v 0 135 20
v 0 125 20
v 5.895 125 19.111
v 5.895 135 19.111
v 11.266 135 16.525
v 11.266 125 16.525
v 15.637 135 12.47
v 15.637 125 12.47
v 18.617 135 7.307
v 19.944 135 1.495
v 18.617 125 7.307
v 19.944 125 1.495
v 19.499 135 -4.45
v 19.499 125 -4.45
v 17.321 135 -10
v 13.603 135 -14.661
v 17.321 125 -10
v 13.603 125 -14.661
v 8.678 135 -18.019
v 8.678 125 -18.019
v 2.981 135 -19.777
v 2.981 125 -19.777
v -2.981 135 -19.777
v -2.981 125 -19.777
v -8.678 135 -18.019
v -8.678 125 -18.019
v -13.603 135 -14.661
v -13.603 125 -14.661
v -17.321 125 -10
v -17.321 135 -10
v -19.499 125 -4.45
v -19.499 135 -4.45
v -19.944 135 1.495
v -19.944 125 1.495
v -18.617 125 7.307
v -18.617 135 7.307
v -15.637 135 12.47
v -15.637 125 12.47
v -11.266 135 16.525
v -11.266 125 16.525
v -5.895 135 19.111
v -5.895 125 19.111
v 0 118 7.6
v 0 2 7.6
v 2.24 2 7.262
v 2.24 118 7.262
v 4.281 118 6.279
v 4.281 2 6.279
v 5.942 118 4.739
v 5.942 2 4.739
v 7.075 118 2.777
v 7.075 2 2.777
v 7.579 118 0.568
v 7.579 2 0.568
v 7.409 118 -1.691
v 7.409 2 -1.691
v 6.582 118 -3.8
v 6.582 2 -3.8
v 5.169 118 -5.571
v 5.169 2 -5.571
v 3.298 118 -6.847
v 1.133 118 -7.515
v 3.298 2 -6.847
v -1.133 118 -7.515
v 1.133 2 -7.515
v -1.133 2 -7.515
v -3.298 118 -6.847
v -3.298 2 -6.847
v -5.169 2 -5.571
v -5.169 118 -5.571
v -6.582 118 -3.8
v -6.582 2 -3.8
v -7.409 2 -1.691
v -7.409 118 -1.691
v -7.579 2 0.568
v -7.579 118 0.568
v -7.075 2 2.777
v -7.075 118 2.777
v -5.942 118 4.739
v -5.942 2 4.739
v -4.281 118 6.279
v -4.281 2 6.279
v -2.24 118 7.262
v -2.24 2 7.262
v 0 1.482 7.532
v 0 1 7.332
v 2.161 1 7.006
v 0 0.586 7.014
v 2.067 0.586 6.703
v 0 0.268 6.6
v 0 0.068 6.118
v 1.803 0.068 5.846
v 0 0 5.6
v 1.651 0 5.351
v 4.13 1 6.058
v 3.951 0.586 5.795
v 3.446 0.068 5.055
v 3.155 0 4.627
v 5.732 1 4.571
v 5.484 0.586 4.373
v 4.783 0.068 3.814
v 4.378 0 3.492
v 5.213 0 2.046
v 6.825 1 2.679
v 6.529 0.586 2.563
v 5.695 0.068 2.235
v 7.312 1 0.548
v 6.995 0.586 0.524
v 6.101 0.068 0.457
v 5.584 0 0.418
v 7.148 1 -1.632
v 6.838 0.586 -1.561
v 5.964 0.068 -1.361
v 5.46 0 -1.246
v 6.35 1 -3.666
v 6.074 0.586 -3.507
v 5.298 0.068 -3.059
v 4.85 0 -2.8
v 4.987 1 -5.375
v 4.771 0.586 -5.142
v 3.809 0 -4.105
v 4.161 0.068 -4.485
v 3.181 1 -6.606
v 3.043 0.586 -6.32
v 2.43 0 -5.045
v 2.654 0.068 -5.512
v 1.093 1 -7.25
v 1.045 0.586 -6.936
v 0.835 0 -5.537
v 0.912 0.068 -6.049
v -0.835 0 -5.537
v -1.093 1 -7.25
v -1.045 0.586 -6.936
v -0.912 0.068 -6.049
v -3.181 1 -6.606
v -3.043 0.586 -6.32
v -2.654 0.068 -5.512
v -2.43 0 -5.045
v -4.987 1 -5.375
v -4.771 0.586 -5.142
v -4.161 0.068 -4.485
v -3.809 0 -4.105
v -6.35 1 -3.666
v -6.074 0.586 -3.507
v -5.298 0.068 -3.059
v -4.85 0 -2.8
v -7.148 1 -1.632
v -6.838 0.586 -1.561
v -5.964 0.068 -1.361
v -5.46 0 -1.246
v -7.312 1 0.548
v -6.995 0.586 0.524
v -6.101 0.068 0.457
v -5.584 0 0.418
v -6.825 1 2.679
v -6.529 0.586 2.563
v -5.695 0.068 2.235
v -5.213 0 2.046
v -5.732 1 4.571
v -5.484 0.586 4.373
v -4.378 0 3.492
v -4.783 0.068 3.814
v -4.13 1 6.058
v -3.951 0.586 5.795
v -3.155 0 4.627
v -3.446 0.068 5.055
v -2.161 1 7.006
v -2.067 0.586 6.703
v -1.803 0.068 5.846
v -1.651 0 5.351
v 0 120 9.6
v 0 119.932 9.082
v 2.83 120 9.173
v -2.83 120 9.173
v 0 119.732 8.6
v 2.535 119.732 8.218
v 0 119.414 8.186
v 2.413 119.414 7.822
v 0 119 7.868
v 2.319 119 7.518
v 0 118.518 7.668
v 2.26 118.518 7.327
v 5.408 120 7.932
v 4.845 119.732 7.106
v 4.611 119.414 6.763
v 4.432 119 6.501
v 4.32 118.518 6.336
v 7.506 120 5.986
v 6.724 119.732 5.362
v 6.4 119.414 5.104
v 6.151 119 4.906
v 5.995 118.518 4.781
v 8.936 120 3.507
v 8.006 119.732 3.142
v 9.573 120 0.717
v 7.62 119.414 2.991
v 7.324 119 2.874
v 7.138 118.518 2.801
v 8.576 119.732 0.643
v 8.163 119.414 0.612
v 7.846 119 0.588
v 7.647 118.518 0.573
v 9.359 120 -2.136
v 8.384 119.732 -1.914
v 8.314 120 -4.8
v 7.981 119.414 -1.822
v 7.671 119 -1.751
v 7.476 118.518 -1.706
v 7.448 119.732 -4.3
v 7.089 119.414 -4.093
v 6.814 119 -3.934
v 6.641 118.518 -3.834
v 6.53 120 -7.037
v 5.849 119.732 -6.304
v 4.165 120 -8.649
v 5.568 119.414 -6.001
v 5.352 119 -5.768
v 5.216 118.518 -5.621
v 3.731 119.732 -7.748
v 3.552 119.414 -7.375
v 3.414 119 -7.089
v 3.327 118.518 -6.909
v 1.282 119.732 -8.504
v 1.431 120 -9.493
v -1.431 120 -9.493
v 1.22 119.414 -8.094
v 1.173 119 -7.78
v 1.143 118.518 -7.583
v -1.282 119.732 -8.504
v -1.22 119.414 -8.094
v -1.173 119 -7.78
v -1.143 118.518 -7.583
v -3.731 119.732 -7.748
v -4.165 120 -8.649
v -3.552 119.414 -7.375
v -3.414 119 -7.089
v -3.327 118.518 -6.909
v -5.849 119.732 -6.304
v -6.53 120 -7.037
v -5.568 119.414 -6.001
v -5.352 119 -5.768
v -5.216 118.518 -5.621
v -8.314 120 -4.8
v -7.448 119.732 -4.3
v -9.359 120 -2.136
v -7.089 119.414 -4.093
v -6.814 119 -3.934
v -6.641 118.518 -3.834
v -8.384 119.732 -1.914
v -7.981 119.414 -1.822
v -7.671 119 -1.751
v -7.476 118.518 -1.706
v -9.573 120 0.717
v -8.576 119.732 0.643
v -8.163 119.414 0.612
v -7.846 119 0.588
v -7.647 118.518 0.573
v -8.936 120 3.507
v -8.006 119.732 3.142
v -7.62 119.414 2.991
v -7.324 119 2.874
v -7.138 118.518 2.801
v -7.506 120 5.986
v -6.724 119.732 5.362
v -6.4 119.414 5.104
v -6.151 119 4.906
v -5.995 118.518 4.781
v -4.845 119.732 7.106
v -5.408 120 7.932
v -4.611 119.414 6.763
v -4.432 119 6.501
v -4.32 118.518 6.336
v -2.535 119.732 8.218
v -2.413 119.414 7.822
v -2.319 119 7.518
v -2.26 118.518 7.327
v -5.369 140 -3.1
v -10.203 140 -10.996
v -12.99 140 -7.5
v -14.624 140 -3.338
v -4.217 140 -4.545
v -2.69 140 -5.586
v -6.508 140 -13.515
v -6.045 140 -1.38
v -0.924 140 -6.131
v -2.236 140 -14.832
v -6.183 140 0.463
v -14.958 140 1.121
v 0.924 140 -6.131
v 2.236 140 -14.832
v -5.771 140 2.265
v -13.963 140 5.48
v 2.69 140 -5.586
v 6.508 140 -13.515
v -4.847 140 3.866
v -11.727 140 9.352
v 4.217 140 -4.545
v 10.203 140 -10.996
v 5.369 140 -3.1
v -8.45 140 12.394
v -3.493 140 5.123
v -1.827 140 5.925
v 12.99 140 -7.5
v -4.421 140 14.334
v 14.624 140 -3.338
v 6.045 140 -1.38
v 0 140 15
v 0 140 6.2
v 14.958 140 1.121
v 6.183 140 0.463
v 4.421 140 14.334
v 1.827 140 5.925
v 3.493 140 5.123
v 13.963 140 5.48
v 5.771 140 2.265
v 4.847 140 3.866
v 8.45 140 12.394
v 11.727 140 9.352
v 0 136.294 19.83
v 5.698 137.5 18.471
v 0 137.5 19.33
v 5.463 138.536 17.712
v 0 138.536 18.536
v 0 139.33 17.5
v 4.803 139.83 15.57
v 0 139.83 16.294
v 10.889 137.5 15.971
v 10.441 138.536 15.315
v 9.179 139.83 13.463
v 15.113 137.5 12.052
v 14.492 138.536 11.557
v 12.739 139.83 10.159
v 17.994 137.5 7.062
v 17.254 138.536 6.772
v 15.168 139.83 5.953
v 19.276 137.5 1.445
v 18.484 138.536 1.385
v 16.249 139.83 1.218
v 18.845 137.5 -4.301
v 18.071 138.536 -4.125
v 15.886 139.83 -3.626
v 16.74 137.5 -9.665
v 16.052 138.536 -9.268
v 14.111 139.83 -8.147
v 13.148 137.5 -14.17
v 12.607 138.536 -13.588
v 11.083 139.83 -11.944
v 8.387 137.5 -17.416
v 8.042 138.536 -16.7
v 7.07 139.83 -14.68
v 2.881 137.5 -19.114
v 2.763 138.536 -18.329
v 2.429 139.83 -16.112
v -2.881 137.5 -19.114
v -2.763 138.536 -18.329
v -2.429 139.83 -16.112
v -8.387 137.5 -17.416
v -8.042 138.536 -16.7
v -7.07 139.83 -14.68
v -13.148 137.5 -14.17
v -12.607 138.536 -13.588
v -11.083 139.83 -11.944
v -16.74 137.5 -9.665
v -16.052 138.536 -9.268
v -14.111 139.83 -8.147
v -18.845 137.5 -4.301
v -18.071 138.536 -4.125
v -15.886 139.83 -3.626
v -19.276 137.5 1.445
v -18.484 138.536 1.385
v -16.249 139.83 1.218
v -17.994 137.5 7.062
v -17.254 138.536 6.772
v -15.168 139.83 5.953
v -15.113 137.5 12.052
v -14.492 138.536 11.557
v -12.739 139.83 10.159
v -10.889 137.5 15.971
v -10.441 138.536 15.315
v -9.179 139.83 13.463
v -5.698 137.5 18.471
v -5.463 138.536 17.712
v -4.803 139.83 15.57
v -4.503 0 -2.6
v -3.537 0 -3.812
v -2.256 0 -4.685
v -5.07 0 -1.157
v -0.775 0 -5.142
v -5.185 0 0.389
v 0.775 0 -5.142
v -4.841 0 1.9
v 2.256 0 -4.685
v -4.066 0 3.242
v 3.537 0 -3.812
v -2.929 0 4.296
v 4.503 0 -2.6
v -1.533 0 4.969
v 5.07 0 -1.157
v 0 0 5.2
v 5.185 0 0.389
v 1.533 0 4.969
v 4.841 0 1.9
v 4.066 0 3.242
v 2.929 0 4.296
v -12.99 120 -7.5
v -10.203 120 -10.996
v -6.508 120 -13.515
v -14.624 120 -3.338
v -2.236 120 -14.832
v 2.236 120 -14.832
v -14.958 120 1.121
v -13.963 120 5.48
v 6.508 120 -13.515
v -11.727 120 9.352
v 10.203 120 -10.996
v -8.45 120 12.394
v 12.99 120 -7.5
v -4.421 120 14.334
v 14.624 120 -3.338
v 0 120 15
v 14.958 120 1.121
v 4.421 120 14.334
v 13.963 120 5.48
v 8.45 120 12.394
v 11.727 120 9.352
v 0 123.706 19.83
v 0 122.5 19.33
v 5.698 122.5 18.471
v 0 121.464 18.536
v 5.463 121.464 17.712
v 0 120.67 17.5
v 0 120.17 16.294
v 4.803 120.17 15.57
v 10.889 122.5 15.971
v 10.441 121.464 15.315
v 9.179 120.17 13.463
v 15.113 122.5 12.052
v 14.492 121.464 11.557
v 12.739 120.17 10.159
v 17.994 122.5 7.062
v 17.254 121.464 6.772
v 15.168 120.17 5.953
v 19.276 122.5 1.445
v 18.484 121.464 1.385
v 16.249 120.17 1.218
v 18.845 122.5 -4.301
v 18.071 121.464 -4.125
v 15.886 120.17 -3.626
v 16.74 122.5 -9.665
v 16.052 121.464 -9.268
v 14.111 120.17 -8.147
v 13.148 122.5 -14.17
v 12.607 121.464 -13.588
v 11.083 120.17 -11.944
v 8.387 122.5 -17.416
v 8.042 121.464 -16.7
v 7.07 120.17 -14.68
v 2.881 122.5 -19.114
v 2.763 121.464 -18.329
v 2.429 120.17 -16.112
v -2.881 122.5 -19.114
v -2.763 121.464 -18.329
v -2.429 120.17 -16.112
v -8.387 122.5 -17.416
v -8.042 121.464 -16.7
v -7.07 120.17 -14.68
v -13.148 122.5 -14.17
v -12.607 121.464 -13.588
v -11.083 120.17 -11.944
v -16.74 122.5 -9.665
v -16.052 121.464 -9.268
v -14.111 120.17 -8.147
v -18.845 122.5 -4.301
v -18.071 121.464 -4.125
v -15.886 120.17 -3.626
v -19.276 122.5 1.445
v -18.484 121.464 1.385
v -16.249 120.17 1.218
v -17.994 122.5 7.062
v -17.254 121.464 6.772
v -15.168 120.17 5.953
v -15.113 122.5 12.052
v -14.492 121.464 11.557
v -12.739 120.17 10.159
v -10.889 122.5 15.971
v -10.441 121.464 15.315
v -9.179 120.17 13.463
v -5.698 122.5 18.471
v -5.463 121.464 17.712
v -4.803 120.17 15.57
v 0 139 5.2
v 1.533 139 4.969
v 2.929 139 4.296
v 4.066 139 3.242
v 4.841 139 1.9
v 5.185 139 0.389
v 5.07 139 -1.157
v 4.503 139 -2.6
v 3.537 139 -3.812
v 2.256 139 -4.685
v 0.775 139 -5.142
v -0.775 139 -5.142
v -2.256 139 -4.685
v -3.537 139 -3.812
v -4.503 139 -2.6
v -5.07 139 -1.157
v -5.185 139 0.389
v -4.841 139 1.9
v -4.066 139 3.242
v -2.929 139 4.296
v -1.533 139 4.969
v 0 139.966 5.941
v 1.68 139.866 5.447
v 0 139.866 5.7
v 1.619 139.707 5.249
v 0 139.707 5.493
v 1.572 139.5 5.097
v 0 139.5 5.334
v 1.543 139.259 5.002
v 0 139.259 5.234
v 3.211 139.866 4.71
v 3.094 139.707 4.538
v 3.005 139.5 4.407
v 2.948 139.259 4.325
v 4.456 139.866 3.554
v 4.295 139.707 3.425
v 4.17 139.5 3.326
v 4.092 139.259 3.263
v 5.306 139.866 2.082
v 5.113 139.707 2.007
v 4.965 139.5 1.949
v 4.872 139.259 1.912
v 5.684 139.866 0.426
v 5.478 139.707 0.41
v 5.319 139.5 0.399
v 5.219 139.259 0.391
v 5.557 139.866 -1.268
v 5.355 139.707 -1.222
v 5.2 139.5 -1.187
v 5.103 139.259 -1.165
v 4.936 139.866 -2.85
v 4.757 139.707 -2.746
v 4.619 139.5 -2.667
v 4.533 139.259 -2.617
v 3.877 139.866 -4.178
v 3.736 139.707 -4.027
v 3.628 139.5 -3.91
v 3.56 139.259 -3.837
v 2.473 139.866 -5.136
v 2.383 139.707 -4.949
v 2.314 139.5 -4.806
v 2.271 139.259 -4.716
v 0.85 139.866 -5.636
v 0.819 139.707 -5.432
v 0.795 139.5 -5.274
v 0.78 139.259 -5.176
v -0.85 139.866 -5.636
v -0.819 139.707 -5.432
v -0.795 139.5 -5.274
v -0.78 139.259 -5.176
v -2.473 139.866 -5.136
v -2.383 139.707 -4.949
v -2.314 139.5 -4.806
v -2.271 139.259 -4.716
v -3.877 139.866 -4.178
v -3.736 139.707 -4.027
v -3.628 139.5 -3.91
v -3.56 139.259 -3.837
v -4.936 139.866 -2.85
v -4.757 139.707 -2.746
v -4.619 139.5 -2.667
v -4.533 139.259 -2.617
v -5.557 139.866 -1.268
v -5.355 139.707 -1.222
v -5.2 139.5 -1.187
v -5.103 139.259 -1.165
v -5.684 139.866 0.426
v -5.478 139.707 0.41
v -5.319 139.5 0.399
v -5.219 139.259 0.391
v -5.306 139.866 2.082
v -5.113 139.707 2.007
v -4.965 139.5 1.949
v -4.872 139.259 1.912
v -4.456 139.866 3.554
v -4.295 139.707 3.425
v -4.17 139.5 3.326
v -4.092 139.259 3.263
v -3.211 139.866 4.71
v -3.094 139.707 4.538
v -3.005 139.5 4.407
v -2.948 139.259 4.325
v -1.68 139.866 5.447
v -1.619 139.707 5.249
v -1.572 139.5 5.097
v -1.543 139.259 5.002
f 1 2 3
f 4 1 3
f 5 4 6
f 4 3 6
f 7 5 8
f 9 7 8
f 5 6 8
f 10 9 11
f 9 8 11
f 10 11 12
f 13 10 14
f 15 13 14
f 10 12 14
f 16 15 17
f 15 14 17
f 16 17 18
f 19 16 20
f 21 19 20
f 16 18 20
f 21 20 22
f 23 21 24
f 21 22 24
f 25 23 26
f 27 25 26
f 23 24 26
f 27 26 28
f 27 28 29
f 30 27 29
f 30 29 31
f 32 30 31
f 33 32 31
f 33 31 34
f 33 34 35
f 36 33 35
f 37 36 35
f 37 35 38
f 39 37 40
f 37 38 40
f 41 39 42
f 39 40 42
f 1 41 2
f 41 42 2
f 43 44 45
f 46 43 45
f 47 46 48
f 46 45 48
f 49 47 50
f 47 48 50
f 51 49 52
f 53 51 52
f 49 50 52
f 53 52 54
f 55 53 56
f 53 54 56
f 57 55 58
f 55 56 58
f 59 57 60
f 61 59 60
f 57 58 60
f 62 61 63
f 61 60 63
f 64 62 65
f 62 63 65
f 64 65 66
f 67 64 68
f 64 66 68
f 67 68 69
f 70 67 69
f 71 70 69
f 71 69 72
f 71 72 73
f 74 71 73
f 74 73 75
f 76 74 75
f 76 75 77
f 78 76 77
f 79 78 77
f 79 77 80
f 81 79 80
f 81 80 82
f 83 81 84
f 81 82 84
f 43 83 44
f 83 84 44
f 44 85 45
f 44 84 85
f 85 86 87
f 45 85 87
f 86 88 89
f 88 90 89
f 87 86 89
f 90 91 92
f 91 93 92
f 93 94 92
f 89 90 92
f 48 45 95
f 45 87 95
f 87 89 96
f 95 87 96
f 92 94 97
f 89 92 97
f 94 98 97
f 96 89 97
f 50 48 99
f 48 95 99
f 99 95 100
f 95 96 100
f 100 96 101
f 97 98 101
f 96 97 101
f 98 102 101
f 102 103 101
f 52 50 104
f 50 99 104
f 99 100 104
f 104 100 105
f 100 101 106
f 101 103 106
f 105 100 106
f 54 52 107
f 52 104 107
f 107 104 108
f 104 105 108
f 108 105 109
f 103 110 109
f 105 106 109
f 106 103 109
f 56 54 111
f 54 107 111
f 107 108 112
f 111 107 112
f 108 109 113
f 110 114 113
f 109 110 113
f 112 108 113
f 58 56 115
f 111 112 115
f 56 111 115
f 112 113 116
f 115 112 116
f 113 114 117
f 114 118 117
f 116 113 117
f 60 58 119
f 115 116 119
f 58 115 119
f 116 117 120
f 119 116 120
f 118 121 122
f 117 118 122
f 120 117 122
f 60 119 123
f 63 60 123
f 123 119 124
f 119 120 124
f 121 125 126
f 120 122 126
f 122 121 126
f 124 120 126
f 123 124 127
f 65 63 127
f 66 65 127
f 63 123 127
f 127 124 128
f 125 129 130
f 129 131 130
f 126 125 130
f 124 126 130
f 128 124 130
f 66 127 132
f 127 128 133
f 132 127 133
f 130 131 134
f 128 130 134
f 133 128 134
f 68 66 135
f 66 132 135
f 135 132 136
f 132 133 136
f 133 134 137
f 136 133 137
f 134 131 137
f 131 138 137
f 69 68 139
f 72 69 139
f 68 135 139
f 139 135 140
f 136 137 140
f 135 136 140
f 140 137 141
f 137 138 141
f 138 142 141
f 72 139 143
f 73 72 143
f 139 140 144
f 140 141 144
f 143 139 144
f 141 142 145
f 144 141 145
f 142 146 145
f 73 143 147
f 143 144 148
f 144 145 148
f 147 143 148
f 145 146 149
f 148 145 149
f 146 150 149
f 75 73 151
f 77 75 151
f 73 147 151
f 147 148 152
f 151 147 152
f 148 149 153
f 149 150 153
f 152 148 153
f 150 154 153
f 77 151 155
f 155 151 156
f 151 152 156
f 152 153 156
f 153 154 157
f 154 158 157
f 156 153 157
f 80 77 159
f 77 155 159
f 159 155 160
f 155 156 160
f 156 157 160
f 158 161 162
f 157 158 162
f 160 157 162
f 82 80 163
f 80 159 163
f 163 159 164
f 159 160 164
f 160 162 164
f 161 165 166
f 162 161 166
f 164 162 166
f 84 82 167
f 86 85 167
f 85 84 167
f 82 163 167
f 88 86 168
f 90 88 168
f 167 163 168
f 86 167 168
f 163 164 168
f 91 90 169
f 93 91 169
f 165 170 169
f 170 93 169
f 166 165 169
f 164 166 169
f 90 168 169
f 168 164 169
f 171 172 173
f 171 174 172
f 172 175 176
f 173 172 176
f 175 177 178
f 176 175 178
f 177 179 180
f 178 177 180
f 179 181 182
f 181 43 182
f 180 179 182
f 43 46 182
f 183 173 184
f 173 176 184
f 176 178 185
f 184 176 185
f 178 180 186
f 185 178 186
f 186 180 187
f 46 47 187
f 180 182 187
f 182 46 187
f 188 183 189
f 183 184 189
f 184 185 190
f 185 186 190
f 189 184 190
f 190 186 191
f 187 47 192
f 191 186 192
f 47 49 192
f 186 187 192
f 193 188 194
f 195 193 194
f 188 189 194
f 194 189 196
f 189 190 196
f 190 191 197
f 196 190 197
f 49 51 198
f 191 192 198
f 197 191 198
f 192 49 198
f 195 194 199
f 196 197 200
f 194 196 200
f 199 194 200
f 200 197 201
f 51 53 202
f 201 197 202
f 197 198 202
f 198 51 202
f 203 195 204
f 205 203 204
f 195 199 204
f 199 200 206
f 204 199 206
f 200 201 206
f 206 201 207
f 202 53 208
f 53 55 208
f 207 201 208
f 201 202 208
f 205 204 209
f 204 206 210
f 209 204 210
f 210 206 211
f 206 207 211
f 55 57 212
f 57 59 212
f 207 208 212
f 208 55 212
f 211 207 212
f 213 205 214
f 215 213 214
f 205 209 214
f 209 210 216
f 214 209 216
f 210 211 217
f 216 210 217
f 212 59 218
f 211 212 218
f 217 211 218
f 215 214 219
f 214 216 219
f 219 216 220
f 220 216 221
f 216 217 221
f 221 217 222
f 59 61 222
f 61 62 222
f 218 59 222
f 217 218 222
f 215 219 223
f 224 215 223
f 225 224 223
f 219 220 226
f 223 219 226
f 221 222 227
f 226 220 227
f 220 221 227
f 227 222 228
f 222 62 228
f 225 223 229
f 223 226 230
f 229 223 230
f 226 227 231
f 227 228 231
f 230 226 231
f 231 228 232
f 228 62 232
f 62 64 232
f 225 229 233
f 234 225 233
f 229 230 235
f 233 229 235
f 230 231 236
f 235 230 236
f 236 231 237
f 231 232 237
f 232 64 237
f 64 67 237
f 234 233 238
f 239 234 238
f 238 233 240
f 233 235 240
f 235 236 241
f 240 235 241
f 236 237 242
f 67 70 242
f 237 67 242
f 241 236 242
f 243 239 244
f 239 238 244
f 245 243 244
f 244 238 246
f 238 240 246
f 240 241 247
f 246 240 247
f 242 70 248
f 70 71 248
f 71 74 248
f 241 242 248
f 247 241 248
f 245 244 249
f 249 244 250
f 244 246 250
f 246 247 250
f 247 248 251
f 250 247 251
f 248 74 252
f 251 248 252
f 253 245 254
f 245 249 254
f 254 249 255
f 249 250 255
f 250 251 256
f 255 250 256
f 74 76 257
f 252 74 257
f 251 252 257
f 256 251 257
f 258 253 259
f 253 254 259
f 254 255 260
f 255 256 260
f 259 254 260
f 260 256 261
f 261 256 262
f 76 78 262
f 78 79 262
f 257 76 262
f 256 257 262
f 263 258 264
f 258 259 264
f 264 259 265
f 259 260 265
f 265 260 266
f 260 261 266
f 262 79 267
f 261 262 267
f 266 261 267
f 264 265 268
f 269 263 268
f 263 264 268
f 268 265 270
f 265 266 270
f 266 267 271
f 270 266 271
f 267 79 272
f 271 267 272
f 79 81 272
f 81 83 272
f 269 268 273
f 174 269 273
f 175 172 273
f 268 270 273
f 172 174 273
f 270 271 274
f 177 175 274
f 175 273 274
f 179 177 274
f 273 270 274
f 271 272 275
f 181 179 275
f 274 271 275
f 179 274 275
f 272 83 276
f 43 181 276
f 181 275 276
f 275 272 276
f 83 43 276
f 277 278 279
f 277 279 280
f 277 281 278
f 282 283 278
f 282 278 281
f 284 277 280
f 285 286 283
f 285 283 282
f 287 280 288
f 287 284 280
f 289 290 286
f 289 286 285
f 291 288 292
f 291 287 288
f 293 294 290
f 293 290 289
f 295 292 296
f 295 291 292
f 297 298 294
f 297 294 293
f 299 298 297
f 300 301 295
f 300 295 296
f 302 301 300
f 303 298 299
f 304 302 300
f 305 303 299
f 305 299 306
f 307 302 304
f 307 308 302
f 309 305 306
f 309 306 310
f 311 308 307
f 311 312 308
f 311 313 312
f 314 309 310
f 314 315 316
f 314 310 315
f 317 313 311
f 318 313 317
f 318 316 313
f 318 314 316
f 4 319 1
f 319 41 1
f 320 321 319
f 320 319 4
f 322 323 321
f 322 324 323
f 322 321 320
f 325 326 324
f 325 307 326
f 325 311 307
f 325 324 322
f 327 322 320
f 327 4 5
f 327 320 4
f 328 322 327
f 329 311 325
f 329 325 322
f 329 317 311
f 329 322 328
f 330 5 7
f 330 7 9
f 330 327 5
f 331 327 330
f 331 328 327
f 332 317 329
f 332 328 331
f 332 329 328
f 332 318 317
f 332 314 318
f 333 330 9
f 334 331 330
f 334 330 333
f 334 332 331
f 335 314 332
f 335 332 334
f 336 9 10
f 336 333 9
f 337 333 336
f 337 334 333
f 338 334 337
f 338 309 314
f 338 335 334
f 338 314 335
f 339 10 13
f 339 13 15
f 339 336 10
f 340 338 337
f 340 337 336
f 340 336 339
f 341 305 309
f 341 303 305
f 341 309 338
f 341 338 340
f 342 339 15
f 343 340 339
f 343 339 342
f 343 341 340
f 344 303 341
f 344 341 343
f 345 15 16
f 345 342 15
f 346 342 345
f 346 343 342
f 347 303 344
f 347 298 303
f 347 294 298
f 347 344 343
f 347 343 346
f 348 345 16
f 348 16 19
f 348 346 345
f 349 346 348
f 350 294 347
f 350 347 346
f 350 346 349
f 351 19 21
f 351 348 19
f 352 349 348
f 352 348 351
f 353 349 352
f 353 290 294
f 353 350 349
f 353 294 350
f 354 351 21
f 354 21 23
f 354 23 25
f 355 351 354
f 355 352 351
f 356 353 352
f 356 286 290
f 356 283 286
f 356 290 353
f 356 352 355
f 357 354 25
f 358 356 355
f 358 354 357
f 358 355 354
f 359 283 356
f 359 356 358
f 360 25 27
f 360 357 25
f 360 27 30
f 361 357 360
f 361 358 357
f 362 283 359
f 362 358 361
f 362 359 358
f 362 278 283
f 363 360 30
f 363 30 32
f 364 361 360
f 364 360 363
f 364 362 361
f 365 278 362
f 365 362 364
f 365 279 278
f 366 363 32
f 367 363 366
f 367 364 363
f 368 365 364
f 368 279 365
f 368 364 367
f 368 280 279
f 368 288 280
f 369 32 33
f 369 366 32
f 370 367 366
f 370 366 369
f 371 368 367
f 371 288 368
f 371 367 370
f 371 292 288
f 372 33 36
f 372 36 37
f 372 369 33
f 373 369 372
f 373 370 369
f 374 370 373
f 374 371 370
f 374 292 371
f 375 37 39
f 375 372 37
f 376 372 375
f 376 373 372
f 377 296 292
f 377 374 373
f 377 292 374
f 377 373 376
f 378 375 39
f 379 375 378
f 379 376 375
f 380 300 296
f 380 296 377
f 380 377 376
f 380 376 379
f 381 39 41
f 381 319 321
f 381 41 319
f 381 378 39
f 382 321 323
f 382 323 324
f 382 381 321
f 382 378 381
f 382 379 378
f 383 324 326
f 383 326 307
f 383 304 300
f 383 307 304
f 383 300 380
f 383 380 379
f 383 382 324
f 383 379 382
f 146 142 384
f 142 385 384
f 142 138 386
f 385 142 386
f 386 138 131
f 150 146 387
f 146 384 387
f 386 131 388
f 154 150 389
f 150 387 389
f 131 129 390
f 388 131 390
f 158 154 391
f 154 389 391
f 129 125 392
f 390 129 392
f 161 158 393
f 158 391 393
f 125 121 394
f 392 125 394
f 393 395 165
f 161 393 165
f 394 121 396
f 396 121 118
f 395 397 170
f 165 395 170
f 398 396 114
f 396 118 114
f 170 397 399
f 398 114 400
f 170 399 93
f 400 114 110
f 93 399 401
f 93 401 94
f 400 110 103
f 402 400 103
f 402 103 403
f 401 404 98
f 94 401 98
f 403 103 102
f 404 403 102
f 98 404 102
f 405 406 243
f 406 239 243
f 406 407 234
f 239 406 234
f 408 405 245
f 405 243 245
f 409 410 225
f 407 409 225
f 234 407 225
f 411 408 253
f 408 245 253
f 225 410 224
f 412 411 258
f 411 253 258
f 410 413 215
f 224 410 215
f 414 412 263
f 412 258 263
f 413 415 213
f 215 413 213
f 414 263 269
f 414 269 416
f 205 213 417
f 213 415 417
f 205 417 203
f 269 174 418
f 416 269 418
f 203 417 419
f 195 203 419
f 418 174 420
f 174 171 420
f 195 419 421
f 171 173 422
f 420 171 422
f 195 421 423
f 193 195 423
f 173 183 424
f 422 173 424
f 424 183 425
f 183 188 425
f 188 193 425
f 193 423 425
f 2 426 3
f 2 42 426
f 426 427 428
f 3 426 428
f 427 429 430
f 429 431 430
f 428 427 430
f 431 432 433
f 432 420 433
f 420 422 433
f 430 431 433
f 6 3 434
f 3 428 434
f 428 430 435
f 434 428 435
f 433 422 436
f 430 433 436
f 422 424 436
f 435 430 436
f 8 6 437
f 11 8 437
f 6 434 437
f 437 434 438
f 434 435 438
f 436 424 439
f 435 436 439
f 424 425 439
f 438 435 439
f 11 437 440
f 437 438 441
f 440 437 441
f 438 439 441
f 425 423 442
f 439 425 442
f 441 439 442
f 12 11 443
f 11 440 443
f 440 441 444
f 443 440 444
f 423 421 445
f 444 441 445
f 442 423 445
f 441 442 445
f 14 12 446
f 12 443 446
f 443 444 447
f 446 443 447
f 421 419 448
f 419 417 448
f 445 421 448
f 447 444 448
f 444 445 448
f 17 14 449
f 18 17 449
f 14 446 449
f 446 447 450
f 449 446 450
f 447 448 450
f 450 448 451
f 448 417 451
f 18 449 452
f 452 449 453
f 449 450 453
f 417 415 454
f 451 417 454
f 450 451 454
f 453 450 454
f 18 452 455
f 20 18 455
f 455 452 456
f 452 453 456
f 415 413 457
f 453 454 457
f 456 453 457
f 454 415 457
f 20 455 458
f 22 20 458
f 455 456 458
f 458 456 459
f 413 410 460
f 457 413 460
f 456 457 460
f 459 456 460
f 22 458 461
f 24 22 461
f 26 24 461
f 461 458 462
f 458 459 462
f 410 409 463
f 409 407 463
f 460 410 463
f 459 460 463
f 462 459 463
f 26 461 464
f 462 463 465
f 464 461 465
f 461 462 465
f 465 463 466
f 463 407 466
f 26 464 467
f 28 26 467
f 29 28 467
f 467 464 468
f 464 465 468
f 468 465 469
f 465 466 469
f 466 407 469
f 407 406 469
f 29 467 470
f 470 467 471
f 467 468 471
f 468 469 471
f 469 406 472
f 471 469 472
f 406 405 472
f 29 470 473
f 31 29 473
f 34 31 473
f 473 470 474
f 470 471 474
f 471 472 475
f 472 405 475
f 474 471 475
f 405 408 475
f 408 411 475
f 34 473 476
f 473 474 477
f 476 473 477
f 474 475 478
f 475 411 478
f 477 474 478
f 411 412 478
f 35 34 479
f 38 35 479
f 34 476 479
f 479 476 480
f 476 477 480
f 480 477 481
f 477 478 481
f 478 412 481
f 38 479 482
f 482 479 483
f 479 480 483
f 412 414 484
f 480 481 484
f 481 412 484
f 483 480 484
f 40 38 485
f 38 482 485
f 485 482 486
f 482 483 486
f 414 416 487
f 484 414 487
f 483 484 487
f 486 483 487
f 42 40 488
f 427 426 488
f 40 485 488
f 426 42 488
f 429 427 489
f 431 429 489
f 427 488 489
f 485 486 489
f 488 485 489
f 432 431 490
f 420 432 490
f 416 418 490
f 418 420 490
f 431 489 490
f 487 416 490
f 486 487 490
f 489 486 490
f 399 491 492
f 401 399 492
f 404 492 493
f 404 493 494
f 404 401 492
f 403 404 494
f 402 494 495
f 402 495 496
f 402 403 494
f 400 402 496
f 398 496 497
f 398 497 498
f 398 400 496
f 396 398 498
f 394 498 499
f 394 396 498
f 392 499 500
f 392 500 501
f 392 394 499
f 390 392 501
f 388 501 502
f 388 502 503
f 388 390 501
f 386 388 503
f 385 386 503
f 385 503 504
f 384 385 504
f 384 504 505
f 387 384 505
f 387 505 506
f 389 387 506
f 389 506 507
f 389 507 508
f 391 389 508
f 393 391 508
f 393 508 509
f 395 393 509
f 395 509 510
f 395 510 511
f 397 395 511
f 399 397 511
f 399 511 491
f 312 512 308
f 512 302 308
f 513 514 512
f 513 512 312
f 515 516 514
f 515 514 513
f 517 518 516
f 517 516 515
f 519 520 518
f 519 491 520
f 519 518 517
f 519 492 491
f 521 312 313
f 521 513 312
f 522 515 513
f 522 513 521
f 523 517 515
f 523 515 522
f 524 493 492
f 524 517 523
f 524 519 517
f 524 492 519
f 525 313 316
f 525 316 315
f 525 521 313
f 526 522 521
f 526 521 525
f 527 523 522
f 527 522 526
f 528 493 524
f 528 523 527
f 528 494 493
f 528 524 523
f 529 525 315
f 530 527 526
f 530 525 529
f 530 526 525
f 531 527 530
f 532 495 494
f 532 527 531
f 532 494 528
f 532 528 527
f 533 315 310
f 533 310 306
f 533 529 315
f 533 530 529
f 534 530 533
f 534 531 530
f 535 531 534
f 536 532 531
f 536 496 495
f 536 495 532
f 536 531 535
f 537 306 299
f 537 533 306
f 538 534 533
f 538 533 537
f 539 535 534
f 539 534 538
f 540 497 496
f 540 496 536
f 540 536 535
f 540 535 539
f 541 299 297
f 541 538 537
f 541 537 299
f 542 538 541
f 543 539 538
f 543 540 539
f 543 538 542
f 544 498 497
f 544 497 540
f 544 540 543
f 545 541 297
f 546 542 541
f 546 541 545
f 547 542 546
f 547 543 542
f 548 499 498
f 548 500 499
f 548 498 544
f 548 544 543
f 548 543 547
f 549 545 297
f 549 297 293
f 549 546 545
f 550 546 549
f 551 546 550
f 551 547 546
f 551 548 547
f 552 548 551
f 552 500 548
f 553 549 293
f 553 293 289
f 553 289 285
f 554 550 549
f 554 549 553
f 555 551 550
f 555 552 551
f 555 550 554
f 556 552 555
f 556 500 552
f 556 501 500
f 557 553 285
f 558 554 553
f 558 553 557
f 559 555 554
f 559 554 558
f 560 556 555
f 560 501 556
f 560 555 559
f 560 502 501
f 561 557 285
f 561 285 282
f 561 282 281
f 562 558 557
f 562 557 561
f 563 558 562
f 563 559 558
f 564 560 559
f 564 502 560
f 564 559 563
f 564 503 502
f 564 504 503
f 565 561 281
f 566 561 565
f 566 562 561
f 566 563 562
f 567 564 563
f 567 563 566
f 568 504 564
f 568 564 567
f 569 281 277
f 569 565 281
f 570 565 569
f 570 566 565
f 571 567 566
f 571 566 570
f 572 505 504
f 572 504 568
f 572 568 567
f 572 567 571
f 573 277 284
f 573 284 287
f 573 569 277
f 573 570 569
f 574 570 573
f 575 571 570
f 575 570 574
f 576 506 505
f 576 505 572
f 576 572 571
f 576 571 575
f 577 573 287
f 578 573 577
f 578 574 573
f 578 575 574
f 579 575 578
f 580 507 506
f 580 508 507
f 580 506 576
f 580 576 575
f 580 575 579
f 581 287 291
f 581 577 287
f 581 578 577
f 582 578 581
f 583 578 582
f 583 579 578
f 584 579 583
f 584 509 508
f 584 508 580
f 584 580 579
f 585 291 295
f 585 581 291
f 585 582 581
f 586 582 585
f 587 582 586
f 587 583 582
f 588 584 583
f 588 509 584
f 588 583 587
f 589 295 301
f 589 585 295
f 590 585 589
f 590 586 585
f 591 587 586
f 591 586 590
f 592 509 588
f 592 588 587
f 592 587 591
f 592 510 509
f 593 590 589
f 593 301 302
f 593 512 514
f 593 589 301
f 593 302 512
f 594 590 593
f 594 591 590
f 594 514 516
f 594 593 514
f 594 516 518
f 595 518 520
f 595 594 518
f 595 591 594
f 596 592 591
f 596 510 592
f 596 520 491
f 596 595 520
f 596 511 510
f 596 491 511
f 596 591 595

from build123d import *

# Parameters (mm, degrees)
SKETCH_1_R          = 7.6
SKETCH_1_R_2        = 5.2
EXTRUDE_1_DEPTH     = 120
SKETCH_2_R          = 20
EXTRUDE_2_DEPTH     = 20
CUT_EXTRUDE_START   = -157
SKETCH_3_R          = 5.2
CUT_EXTRUDE_1_DEPTH = 157
FILLET_1_R          = 5
FILLET_2_R          = 2
FILLET_3_R          = 1


with BuildPart() as part:
    # 草图1 → 凸台-拉伸1 (new body)
    with BuildSketch(Plane(origin=(0, 0, 0), x_dir=(1, 0, 0), z_dir=(0, 1, 0))):
        with Locations(Location((0, 0, 0), (0, 0, 270))):
            Circle(SKETCH_1_R)
        with Locations(Location((0, 0, 0), (0, 0, 270))):
            Circle(SKETCH_1_R_2, mode=Mode.SUBTRACT)
    extrude(amount=EXTRUDE_1_DEPTH)

    # 草图2 → 凸台-拉伸2 (add)
    with BuildSketch(Plane(origin=(0, 120, 0), x_dir=(1, 0, 0), z_dir=(0, 1, 0))):
        with Locations(Location((0, 0, 0), (0, 0, 270))):
            Circle(SKETCH_2_R)
    extrude(amount=EXTRUDE_2_DEPTH)

    # 草图3 → 切除-拉伸1 (cut)
    with BuildSketch(Plane(origin=(0, 140, 0), x_dir=(1, 0, 0), z_dir=(0, 1, 0)).offset(CUT_EXTRUDE_START)):
        with Locations(Location((0, 0, 0), (0, 0, 270))):
            Circle(SKETCH_3_R)
    extrude(amount=CUT_EXTRUDE_1_DEPTH, mode=Mode.SUBTRACT)

    # 圆角1
    fillet_1_edges = [part.edges().sort_by_distance(p)[0] for p in [
        (0, 140, -20),
        (0, 120, -20),
    ]]
    fillet(fillet_1_edges, radius=FILLET_1_R)

    # 圆角2
    fillet_2_edges = [part.edges().sort_by_distance(p)[0] for p in [
        (0, 0, -7.6),
        (0, 120, -7.6),
    ]]
    fillet(fillet_2_edges, radius=FILLET_2_R)

    # 圆角3
    fillet_3_edges = [part.edges().sort_by_distance(p)[0] for p in [
        (0, 140, -5.2),
    ]]
    fillet(fillet_3_edges, radius=FILLET_3_R)


solid = part.part
